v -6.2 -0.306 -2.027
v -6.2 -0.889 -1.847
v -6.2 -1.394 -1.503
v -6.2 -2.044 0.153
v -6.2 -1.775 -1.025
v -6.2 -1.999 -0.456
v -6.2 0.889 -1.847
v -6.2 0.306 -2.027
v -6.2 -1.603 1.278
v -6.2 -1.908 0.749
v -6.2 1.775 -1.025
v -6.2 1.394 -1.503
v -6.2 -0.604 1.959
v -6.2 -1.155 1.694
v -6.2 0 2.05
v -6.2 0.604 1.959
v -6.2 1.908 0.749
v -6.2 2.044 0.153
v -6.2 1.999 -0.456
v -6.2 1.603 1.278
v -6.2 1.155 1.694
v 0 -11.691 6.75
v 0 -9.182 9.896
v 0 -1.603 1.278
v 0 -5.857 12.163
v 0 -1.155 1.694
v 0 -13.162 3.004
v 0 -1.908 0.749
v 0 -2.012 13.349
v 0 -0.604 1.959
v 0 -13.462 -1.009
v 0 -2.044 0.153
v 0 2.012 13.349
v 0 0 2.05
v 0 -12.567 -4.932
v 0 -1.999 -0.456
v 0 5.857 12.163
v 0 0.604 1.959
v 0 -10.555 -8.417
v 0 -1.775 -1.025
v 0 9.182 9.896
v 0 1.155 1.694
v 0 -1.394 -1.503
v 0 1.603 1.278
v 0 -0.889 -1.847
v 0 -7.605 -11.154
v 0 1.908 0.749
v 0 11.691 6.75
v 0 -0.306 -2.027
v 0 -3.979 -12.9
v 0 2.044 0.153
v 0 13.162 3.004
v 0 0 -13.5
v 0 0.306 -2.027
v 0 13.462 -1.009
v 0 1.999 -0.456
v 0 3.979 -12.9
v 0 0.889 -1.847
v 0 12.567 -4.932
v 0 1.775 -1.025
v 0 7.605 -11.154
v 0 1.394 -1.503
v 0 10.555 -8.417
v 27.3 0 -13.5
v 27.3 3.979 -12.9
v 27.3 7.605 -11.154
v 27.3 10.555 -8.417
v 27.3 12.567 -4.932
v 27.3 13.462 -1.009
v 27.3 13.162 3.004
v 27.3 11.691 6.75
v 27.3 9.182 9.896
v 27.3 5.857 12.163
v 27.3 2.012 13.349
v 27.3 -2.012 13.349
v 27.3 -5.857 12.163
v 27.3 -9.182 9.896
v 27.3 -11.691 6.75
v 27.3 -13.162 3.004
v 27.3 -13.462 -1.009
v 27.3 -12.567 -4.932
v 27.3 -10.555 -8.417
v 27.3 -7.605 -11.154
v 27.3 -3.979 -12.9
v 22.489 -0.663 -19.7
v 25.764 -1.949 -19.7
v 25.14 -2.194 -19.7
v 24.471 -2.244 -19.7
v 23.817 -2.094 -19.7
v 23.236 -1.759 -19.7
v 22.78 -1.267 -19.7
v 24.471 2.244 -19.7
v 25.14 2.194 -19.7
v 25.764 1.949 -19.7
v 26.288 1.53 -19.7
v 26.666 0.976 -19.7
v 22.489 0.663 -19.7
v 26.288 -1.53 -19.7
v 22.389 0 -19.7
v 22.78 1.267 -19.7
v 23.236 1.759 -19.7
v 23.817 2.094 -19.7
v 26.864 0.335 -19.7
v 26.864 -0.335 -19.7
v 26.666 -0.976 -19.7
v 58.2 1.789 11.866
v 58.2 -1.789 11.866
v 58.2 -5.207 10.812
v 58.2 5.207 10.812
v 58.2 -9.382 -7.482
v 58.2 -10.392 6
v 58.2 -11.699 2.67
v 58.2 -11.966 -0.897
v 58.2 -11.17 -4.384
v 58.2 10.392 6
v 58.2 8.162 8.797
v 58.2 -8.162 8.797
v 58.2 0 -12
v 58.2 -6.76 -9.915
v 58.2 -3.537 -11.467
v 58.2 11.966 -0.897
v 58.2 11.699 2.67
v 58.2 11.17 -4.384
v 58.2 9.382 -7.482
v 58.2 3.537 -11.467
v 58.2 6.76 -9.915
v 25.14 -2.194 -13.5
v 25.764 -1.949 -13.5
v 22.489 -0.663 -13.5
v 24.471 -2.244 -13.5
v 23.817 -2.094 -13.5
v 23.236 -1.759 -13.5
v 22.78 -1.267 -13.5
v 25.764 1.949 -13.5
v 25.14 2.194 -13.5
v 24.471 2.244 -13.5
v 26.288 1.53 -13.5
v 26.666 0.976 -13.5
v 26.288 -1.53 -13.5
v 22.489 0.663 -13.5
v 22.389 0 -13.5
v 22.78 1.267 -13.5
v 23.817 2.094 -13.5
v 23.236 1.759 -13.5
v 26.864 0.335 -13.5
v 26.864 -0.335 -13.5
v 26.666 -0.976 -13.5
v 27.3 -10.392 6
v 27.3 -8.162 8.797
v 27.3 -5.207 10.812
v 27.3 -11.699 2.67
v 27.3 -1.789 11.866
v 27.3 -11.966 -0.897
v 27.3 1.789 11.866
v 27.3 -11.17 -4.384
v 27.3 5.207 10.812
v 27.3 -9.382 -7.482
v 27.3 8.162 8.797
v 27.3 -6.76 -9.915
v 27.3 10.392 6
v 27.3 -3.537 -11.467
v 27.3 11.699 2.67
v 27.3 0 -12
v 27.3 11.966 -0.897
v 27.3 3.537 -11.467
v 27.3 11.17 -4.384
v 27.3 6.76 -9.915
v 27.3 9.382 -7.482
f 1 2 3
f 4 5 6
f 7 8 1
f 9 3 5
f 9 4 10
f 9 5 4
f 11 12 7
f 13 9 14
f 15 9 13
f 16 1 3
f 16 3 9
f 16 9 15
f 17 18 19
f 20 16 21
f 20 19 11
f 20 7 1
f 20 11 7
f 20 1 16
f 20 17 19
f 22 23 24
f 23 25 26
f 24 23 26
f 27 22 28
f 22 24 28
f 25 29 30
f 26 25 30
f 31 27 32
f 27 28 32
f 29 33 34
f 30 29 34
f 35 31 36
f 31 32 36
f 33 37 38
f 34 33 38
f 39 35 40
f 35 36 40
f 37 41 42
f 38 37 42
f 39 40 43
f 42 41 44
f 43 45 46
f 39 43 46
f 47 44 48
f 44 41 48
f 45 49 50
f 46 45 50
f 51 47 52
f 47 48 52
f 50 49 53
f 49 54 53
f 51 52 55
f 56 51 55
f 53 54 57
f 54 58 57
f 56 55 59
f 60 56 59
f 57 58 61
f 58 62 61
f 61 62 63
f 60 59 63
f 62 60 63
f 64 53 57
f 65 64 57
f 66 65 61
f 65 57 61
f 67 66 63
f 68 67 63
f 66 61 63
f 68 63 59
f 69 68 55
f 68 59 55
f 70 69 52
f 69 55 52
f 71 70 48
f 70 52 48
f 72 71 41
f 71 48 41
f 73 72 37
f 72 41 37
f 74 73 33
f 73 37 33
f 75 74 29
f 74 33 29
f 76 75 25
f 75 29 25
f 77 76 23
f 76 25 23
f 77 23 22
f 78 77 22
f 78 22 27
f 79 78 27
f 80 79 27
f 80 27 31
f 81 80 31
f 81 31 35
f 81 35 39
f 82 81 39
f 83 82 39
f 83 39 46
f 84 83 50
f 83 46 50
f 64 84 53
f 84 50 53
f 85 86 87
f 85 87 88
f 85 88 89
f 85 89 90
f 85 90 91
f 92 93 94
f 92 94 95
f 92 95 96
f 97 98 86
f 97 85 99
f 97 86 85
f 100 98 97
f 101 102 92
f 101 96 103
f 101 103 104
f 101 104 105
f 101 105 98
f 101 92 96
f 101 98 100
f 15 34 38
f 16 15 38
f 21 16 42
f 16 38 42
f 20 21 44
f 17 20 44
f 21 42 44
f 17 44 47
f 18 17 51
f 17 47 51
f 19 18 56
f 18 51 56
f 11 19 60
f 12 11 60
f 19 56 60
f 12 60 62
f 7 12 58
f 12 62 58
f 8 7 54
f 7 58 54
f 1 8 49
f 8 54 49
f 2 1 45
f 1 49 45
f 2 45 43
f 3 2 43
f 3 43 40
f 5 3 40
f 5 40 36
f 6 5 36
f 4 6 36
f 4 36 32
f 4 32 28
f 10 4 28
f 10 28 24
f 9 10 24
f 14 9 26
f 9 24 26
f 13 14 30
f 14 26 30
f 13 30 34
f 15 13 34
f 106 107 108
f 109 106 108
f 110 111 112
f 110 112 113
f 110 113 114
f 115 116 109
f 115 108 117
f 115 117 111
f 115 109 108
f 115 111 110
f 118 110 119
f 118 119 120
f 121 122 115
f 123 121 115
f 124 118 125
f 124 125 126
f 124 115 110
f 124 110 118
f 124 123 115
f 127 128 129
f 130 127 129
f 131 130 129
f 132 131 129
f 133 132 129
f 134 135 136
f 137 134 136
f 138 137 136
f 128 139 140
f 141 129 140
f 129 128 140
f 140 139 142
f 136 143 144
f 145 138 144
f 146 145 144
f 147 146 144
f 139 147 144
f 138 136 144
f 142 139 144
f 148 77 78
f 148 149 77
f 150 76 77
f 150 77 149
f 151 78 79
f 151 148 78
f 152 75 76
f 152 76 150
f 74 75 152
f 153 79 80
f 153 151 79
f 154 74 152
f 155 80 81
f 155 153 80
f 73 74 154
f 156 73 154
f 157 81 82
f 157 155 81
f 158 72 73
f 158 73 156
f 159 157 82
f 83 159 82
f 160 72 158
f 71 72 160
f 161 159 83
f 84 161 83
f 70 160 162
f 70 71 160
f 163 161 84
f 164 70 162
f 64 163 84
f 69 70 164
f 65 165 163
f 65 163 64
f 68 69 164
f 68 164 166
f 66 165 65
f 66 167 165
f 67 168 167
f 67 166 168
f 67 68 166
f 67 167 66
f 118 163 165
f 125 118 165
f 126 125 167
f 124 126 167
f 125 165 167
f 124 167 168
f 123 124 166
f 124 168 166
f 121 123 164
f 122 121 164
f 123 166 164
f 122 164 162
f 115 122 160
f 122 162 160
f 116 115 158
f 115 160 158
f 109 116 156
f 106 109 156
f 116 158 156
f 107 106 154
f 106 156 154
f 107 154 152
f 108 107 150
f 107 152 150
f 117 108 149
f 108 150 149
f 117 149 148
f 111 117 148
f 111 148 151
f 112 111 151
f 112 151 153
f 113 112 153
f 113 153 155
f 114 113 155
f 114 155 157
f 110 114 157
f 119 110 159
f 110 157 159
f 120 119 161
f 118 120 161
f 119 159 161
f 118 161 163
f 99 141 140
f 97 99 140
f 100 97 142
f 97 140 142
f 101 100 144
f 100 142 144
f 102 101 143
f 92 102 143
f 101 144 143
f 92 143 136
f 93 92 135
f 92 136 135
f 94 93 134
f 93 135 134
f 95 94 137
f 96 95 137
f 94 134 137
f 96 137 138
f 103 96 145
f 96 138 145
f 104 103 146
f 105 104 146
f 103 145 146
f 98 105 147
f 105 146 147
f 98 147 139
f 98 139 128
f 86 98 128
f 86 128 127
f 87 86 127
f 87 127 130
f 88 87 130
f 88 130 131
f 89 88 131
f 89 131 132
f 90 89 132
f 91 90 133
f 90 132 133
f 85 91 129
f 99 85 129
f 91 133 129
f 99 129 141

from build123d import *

# Parameters (mm, degrees)
SKETCH_1_R      = 13.5
EXTRUDE_1_DEPTH = 27.3
SKETCH_2_R      = 12
EXTRUDE_2_DEPTH = 30.9
SKETCH_3_R      = 2.05
EXTRUDE_3_DEPTH = 6.2
SKETCH_4_R      = 2.25
EXTRUDE_4_DEPTH = 6.2


with BuildPart() as part:
    # 草图1 → 凸台-拉伸1 (new body)
    with BuildSketch(Plane(origin=(0, 0, 0), x_dir=(0, 0, -1), z_dir=(1, 0, 0))):
        Circle(SKETCH_1_R)
    extrude(amount=EXTRUDE_1_DEPTH)

    # 草图2 → 凸台-拉伸2 (add)
    with BuildSketch(Plane(origin=(27.3, 0, 0), x_dir=(0, 0, -1), z_dir=(1, 0, 0))):
        Circle(SKETCH_2_R)
    extrude(amount=EXTRUDE_2_DEPTH)

    # 草图3 → 凸台-拉伸3 (add)
    with BuildSketch(Plane.ZY):
        Circle(SKETCH_3_R)
    extrude(amount=EXTRUDE_3_DEPTH)


with BuildPart() as body_2:
    # 草图4 → 凸台-拉伸4 (new body)
    with BuildSketch(Plane(origin=(0, 0, -13.5), x_dir=(-1, 0, 0), z_dir=(0, 0, -1))):
        with Locations((-24.6389246, 0)):
            Circle(SKETCH_4_R)
    extrude(amount=EXTRUDE_4_DEPTH)


solid = Compound([part.part, body_2.part])
